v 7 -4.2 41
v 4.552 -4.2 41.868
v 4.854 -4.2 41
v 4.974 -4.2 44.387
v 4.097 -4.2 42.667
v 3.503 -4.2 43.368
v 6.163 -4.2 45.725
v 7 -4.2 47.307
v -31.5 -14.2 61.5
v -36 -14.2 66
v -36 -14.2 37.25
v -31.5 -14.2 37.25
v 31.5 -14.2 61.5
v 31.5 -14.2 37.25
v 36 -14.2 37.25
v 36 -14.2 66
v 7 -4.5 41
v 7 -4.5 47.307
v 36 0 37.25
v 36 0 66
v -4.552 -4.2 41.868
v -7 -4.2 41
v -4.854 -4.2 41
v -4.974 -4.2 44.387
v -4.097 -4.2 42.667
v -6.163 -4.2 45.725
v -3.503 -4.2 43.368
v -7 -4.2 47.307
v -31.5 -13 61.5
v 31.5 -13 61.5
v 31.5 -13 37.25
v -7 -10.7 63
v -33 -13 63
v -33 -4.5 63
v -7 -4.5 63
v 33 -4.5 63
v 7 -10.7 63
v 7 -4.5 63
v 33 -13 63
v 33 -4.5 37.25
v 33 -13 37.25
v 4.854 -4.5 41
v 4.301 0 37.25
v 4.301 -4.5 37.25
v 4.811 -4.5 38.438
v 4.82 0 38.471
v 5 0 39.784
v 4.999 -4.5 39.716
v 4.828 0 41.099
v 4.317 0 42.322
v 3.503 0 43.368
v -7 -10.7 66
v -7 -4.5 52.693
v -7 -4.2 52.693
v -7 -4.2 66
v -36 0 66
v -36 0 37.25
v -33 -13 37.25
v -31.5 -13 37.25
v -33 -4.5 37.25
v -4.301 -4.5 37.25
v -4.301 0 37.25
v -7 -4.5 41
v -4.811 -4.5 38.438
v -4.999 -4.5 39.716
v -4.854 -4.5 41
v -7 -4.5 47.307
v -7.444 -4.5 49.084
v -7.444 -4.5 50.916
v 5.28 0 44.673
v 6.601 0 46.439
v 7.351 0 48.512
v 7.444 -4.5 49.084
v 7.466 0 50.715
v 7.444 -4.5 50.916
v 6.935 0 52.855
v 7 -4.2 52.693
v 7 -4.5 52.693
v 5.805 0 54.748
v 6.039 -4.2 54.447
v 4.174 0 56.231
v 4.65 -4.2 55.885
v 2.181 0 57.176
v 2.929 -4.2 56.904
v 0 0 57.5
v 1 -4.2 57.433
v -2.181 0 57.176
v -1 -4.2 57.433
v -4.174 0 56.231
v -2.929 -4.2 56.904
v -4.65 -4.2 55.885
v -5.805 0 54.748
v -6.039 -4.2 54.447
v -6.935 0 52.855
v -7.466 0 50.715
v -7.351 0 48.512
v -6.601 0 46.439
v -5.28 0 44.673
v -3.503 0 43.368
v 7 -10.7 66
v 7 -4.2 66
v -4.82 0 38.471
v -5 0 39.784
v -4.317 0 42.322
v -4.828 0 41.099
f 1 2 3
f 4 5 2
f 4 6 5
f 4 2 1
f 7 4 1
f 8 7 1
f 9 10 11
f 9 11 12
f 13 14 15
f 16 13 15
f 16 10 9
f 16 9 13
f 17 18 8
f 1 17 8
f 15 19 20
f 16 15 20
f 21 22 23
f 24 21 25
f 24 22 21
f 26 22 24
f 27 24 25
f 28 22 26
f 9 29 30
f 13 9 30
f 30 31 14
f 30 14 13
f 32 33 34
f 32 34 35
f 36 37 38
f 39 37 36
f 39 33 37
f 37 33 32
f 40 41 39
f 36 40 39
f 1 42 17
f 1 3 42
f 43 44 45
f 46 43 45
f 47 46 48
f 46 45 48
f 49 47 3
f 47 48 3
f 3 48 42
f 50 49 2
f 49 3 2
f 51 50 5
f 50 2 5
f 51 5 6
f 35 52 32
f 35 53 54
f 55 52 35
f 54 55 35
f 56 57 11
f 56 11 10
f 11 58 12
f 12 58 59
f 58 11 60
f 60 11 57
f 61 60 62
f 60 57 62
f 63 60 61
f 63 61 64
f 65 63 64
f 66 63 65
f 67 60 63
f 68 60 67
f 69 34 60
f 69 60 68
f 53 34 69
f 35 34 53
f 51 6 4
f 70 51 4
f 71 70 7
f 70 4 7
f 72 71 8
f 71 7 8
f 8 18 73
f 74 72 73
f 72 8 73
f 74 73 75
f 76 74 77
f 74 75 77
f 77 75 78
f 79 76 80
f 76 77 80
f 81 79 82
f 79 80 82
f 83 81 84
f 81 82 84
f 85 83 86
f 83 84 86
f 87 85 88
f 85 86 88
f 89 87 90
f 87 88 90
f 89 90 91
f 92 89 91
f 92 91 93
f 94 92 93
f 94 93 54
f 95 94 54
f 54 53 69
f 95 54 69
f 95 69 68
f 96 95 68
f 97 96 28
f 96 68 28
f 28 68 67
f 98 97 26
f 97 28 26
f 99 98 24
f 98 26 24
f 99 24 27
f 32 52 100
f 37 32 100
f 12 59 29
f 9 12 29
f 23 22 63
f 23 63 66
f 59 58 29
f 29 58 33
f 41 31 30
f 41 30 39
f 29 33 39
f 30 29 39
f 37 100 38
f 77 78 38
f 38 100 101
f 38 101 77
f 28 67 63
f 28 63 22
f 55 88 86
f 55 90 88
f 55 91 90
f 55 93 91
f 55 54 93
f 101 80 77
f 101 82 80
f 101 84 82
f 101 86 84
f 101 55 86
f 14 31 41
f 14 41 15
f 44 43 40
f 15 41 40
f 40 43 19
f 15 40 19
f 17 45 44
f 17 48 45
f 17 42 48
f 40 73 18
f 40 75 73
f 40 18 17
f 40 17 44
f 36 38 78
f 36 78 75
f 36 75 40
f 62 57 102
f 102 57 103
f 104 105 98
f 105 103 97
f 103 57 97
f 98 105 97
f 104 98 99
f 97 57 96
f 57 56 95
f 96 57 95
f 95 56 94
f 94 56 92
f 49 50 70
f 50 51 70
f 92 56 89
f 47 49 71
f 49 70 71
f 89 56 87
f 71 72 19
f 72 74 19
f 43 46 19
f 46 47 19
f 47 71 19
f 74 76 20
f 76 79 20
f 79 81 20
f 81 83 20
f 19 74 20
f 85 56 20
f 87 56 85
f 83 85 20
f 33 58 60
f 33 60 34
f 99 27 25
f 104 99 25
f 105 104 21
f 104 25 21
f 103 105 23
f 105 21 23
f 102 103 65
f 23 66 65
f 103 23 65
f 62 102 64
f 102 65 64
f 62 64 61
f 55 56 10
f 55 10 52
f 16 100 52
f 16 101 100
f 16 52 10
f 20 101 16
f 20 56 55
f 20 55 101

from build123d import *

# Parameters (mm, degrees)
F0_W      = 72
F0_H      = 132
F1_DEPTH  = 13
F2_W      = 66
F2_H      = 126
F3_DEPTH  = 8.5
F4_W      = 72
F4_H      = 132
F4_W_2    = 66
F4_H_2    = 126
F4_W_3    = 63
F4_H_3    = 123
F5_DEPTH  = 1.2
F6_R      = 7.5
F7_DEPTH  = 25
F8_DEPTH  = 25
F9_R      = 5
F10_DEPTH = 25
F11_W     = 14
F11_H     = 6.5
F12_DEPTH = 25
F13_W     = 35
F13_H     = 3
F14_DEPTH = 25
F15_W     = 95.4631343484
F15_H     = 107.6438874006
F16_DEPTH = 14.201


with BuildPart() as f1:
    # F0 (on Front) → F1 (new body)
    with BuildSketch(Plane.XZ):
        Rectangle(F0_W, F0_H)
    extrude(amount=F1_DEPTH)

    # F2 (on face) → F3 (cut)
    with BuildSketch(Plane.XZ.offset(13)):
        Rectangle(F2_W, F2_H)
    extrude(amount=-F3_DEPTH, mode=Mode.SUBTRACT)

    # F4 (on face) → F5 (join)
    with BuildSketch(Plane.XZ.offset(13)):
        Rectangle(F4_W, F4_H)
        Rectangle(F4_W_2, F4_H_2, mode=Mode.SUBTRACT)
        Rectangle(F4_W_2, F4_H_2)
        Rectangle(F4_W_3, F4_H_3, mode=Mode.SUBTRACT)
    extrude(amount=F5_DEPTH)

    # F6 (on face) → F7 (cut)
    with BuildSketch(Plane.XZ.offset(4.5)):
        with Locations((0, 50)):
            Circle(F6_R)
    extrude(amount=-F7_DEPTH, mode=Mode.SUBTRACT)

    # F6 (on face) → F8 (cut)
    with BuildSketch(Plane.XZ.offset(4.5)):
        with Locations((0, 50)):
            Circle(F6_R)
    extrude(amount=-F8_DEPTH, mode=Mode.SUBTRACT)

    # F9 (on face) → F10 (cut)
    with BuildSketch(Plane.XZ.offset(4.5)):
        with Locations((0, 39.799913764)):
            Circle(F9_R)
    extrude(amount=-F10_DEPTH, mode=Mode.SUBTRACT)

    # F11 (on face) → F12 (cut)
    with BuildSketch(Plane.XY.offset(66)):
        with Locations((0, -7.45)):
            Rectangle(F11_W, F11_H)
    extrude(amount=-F12_DEPTH, mode=Mode.SUBTRACT)

    # F13 (on face) → F14 (cut)
    with BuildSketch(Plane.XZ.offset(4.5)):
        with Locations((0, -54)):
            Rectangle(F13_W, F13_H)
    extrude(amount=-F14_DEPTH, mode=Mode.SUBTRACT)

    # F15 (on Front) → F16 (cut, through all)
    with BuildSketch(Plane.XZ):
        with Locations((-3.6825537682, -16.5714919567)):
            Rectangle(F15_W, F15_H)
    extrude(amount=F16_DEPTH, mode=Mode.SUBTRACT)


solid = f1.part
